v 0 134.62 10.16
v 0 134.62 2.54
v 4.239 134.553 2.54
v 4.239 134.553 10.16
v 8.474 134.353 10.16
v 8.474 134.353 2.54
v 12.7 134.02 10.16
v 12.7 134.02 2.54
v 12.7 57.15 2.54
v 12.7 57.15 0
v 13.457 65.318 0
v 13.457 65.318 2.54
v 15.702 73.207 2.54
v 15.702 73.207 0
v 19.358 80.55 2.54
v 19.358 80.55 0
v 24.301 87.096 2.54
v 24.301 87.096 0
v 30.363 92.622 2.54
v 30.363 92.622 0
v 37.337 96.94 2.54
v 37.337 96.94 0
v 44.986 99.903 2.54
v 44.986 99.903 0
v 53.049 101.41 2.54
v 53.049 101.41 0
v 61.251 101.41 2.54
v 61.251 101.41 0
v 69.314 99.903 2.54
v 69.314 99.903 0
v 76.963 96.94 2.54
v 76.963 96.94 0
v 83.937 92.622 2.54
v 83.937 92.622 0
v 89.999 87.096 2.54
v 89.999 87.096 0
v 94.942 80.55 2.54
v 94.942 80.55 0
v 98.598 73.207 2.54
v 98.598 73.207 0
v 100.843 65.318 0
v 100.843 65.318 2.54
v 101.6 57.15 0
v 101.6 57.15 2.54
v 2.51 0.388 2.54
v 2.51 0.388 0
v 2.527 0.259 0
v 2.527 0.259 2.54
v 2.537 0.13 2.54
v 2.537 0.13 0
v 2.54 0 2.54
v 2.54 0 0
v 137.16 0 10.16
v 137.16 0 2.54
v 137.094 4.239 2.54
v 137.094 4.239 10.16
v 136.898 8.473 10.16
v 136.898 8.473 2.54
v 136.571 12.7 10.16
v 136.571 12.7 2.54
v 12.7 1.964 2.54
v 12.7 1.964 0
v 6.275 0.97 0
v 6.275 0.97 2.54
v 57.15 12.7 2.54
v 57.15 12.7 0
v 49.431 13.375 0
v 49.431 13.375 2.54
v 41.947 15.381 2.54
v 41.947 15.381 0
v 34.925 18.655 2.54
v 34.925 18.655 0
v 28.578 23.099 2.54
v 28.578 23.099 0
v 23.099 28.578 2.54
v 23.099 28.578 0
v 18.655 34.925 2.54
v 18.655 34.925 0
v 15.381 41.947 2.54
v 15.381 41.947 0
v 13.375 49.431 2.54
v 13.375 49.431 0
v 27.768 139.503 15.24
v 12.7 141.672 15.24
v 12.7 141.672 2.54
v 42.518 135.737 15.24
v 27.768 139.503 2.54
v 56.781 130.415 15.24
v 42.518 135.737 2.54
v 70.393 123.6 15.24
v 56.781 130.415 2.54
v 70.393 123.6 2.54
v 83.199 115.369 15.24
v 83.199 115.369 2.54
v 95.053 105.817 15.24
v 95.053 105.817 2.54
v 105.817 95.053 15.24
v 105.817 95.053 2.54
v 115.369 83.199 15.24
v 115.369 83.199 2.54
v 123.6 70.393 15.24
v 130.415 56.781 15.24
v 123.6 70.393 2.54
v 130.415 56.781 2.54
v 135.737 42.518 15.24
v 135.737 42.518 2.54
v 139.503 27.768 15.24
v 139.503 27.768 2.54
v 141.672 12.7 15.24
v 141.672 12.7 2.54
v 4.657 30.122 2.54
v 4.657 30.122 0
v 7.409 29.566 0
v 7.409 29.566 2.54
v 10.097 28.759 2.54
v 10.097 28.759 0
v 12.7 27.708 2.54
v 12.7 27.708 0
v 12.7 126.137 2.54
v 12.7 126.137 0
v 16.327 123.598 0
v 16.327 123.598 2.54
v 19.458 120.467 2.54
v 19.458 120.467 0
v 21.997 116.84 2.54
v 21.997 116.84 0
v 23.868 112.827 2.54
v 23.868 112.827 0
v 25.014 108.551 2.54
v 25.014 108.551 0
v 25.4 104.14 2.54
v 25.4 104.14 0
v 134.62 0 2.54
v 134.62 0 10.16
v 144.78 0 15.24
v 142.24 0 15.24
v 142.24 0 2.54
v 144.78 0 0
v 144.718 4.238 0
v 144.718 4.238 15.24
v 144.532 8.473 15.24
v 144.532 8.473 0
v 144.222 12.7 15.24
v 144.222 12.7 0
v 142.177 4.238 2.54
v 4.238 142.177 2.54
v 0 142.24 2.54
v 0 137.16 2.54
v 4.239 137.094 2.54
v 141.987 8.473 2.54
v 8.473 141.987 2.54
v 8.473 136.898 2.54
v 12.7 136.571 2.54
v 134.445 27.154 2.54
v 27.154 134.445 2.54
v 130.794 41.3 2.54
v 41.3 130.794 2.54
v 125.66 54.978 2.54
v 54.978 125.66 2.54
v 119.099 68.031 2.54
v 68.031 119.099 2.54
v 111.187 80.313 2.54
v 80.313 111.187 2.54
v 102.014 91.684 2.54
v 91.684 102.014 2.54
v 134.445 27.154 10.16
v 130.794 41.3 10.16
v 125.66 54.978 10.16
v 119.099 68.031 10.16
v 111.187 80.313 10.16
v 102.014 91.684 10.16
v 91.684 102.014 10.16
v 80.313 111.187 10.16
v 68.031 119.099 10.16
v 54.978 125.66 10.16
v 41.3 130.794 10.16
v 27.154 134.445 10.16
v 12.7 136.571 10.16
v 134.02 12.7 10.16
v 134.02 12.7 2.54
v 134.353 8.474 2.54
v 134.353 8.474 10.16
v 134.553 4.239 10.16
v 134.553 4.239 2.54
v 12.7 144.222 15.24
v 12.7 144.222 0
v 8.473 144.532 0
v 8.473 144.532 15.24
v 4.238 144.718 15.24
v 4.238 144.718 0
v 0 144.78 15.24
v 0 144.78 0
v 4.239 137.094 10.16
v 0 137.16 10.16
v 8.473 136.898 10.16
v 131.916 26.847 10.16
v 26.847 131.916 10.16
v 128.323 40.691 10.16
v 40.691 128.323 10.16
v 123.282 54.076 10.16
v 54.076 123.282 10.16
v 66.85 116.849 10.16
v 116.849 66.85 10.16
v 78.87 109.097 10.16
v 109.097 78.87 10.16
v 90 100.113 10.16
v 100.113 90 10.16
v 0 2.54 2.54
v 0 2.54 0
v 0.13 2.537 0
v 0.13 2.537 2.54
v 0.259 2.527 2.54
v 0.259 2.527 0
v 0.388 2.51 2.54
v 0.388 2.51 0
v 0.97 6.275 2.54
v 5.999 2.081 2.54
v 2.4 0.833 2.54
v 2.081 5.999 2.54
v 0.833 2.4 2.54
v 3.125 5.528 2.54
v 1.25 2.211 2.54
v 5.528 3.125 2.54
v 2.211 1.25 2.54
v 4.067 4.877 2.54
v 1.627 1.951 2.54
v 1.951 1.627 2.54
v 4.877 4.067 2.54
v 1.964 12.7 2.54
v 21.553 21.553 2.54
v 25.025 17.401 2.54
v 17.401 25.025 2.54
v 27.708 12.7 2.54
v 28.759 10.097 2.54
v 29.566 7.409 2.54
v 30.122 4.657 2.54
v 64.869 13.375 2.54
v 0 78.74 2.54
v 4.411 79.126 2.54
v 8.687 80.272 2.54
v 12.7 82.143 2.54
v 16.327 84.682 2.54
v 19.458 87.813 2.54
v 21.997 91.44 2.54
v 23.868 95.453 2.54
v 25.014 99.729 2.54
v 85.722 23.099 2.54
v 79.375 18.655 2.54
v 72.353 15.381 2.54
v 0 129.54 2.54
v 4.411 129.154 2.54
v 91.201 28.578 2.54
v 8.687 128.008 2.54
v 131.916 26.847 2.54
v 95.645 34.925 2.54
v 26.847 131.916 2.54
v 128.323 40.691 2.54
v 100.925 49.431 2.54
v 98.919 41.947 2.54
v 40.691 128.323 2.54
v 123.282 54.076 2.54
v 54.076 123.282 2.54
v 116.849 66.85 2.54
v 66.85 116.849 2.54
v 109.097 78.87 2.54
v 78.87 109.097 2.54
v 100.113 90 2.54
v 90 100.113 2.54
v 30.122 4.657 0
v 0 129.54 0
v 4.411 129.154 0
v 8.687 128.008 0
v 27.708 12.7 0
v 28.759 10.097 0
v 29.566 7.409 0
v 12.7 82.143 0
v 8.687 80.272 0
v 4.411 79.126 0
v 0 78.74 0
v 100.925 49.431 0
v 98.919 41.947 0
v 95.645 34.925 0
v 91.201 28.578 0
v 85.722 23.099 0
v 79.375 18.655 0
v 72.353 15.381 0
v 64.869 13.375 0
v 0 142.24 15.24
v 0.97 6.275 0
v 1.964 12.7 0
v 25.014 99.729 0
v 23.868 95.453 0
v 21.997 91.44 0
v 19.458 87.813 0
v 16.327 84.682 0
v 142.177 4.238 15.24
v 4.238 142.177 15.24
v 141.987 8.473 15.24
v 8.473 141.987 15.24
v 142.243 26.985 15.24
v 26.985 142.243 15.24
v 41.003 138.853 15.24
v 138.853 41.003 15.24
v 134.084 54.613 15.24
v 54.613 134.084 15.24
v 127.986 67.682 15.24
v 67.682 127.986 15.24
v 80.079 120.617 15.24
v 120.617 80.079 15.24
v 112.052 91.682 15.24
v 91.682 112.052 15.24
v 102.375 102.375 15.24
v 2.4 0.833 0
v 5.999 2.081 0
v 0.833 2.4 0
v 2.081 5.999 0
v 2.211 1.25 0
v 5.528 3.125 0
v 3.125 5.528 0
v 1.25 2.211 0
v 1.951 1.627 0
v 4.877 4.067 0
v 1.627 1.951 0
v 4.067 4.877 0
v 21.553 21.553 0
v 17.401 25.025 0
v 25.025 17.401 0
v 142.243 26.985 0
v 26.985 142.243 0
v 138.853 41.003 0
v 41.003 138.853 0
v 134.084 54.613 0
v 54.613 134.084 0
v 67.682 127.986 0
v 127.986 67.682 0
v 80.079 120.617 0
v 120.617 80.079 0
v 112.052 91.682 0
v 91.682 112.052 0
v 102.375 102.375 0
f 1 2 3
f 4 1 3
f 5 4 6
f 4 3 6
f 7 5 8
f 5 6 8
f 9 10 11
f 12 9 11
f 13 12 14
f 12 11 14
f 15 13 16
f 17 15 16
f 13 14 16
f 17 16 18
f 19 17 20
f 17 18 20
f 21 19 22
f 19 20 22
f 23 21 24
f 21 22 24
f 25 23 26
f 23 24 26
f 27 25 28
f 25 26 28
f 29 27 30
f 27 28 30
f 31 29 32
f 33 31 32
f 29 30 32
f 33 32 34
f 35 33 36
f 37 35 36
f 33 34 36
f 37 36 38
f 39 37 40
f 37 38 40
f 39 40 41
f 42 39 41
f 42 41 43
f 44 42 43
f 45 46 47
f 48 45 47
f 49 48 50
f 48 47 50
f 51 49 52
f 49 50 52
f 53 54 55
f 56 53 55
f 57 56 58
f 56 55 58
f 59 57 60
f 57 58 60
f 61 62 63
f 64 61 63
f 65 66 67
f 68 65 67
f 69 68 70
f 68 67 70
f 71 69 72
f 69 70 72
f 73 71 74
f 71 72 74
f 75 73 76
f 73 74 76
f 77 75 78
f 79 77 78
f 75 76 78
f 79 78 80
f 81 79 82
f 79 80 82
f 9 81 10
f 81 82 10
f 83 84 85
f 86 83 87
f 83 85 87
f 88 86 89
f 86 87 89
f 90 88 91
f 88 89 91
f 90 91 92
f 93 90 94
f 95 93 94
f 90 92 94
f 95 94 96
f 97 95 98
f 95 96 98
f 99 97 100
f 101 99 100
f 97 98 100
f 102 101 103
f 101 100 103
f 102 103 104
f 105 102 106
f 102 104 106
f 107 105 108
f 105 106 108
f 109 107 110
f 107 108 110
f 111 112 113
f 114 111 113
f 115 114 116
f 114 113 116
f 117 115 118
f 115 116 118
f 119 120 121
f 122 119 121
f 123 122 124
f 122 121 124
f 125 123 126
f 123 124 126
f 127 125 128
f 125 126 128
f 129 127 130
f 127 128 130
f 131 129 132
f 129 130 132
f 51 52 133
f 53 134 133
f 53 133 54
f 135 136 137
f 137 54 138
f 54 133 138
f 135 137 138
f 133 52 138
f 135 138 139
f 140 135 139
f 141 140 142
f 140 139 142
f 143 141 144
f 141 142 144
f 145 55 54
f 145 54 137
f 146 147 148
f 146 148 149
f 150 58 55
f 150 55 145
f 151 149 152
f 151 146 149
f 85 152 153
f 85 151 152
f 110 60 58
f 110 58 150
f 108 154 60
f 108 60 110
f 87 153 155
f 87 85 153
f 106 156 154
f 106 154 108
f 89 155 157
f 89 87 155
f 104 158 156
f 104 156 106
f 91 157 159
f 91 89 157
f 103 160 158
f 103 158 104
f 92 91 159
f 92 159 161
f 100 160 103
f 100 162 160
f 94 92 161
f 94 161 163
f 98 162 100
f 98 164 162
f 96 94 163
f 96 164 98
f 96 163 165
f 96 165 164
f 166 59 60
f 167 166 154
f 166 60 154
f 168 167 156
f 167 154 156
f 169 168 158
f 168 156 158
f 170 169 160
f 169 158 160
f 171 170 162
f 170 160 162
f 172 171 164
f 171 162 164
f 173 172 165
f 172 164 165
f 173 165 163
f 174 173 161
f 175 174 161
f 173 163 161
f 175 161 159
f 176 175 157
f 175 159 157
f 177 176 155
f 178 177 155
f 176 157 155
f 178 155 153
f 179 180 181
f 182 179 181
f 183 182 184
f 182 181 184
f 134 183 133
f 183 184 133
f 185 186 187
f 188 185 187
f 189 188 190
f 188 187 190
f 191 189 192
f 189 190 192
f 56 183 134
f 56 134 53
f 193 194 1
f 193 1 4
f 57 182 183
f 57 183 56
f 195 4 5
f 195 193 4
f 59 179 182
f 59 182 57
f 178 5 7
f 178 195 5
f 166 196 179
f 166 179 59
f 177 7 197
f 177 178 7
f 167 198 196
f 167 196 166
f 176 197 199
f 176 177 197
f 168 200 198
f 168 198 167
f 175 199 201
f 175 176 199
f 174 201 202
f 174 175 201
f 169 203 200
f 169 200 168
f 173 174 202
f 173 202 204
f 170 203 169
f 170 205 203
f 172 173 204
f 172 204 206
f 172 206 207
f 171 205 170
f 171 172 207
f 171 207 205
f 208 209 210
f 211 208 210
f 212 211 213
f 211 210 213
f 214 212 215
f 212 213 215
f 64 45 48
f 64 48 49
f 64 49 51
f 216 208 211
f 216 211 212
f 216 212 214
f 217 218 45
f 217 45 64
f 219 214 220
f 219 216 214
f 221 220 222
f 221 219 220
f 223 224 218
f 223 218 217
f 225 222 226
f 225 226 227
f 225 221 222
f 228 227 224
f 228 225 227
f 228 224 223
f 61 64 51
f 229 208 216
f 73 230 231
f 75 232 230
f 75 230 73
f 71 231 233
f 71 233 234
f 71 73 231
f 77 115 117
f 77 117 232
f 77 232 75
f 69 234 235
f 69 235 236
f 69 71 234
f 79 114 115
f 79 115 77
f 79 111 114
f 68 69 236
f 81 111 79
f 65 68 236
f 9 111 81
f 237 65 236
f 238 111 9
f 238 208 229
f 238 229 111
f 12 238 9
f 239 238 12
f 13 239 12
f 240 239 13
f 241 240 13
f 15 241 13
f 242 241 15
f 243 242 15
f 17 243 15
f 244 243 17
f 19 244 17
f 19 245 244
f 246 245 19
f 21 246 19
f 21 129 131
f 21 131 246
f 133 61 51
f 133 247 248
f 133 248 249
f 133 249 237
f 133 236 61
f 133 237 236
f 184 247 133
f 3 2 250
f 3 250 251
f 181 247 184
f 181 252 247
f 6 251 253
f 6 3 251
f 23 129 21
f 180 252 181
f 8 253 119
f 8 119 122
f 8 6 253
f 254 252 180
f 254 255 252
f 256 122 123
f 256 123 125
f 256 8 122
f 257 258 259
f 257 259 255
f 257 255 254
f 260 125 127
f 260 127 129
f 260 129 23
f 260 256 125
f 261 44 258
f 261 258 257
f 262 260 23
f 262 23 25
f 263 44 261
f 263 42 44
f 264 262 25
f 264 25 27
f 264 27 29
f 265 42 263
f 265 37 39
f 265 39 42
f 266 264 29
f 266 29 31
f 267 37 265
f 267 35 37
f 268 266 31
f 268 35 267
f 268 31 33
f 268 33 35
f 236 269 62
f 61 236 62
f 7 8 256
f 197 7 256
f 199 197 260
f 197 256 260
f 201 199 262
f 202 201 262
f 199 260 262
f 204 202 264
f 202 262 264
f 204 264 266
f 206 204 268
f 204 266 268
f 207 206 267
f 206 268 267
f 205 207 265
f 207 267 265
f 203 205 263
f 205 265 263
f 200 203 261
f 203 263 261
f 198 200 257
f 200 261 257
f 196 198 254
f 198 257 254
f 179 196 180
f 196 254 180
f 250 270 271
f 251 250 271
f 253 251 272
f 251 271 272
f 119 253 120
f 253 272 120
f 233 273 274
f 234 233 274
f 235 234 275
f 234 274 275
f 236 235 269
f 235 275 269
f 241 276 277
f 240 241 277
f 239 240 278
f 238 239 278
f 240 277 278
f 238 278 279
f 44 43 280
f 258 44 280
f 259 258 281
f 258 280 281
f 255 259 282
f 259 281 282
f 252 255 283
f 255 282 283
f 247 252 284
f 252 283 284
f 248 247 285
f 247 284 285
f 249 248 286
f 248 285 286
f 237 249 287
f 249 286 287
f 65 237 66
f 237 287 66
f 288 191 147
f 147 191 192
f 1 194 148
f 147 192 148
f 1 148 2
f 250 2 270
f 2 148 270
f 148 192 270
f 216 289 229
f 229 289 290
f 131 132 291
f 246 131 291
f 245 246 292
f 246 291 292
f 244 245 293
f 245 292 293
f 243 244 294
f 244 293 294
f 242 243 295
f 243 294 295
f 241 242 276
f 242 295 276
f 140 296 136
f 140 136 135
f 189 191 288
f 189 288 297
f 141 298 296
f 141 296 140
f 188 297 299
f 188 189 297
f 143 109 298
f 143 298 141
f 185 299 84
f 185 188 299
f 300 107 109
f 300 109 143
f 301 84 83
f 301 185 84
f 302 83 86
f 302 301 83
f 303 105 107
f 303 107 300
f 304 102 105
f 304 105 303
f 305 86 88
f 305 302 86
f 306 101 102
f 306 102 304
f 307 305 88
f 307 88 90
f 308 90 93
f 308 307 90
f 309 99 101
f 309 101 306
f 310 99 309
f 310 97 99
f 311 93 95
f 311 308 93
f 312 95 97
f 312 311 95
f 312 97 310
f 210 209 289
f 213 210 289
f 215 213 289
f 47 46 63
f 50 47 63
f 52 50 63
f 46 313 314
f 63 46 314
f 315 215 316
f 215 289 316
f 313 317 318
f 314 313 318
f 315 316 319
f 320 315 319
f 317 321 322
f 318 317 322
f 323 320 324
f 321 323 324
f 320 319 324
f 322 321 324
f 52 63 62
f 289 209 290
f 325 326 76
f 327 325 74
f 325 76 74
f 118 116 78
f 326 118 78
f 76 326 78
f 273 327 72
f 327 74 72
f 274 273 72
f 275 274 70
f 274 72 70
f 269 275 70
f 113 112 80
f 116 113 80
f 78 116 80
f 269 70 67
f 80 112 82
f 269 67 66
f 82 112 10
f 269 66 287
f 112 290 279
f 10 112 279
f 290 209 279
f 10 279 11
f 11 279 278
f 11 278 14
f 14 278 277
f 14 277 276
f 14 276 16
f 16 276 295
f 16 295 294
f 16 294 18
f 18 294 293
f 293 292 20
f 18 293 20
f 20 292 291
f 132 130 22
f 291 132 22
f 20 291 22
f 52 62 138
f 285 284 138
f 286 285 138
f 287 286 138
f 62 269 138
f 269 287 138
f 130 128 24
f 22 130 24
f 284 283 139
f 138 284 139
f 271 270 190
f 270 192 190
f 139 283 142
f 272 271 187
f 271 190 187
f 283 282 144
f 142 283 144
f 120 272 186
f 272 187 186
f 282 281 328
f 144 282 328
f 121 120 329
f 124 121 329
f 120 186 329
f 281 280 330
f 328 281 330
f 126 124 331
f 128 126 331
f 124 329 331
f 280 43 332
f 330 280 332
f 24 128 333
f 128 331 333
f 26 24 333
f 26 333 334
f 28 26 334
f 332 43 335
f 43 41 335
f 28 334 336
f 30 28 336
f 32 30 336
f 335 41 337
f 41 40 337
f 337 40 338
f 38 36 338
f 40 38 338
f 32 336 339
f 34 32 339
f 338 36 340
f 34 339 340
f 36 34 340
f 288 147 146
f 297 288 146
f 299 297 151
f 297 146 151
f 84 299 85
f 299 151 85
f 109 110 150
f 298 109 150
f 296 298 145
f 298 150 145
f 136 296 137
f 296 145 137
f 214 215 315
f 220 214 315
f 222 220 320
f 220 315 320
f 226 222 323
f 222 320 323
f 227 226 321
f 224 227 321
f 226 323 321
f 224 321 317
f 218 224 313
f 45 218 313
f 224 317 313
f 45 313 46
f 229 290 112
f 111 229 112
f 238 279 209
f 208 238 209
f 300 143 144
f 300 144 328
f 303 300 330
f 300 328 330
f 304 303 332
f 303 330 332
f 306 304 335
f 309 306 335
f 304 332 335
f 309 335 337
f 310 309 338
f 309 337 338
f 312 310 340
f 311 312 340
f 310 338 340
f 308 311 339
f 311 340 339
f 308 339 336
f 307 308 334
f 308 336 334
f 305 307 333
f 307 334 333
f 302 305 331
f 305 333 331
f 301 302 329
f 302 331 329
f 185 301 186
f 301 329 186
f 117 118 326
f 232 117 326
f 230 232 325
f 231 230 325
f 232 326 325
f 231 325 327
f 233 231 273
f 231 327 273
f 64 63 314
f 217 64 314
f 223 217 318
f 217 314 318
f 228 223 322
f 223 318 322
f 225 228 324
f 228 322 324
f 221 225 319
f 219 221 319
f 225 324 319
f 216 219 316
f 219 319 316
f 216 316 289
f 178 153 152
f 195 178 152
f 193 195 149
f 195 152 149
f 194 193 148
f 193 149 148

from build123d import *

# Parameters (mm, degrees)
F1_DEPTH = 2.54
F2_DEPTH = 10.16
F3_DEPTH = 2.54
F4_DEPTH = 15.24


with BuildPart() as f1:
    # F0 (on Top) → F1 (new body)
    with BuildSketch(Plane.XY):
        with BuildLine():
            Line((4.6571345698, 30.12210978), (12.7, 82.1429547439))
            ThreePointArc((12.7, 82.1429547439), (6.5740037456, 79.6054840123), (0, 78.74))
            Line((0, 78.74), (0, 30.48))
            ThreePointArc((0, 30.48), (2.3354329262, 30.3903957369), (4.6571345698, 30.12210978))
        make_face()
        with BuildLine():
            Line((12.7, 57.15), (12.7, 82.1429547439))
            Line((12.7, 82.1429547439), (4.6571345698, 30.12210978))
            ThreePointArc((4.6571345698, 30.12210978), (8.7620977053, 29.1934246673), (12.7, 27.7081287712))
            Line((12.7, 27.7081287712), (12.7, 57.15))
        make_face()
        with BuildLine():
            Line((1.9635281017, 12.7), (4.6571345698, 30.12210978))
            ThreePointArc((4.6571345698, 30.12210978), (2.3354329262, 30.3903957369), (0, 30.48))
            Line((0, 30.48), (0, 12.7))
            Line((0, 12.7), (1.9635281017, 12.7))
        make_face()
        with BuildLine():
            Line((0.9702363687, 6.2754395375), (1.9635281017, 12.7))
            Line((1.9635281017, 12.7), (0, 12.7))
            Line((0, 12.7), (0, 6.35))
            ThreePointArc((0, 6.35), (0.4865485263, 6.3313324452), (0.9702363687, 6.2754395375))
        make_face()
        with BuildLine():
            Line((0.3880945475, 2.510175815), (0.9702363687, 6.2754395375))
            ThreePointArc((0.9702363687, 6.2754395375), (0.4865485263, 6.3313324452), (0, 6.35))
            Line((0, 6.35), (0, 2.54))
            ThreePointArc((0, 2.54), (0.1946194105, 2.5325329781), (0.3880945475, 2.510175815))
        make_face()
        with BuildLine():
            Line((2.510175815, 0.3880945475), (6.2754395375, 0.9702363687))
            ThreePointArc((6.2754395375, 0.9702363687), (4.4901280605, 4.4901280605), (0.9702363687, 6.2754395375))
            Line((0.9702363687, 6.2754395375), (0.3880945475, 2.510175815))
            ThreePointArc((0.3880945475, 2.510175815), (1.7960512242, 1.7960512242), (2.510175815, 0.3880945475))
        make_face()
        with BuildLine():
            Line((2.54, 0), (6.35, 0))
            ThreePointArc((6.35, 0), (6.3313324452, 0.4865485263), (6.2754395375, 0.9702363687))
            Line((6.2754395375, 0.9702363687), (2.510175815, 0.3880945475))
            ThreePointArc((2.510175815, 0.3880945475), (2.5325329781, 0.1946194105), (2.54, 0))
        make_face()
        with BuildLine():
            Line((6.35, 0), (12.7, 0))
            Line((12.7, 0), (12.7, 1.9635281017))
            Line((12.7, 1.9635281017), (6.2754395375, 0.9702363687))
            ThreePointArc((6.2754395375, 0.9702363687), (6.3313324452, 0.4865485263), (6.35, 0))
        make_face()
        with BuildLine():
            Line((12.7, 0), (30.48, 0))
            ThreePointArc((30.48, 0), (30.3903957369, 2.3354329262), (30.12210978, 4.6571345698))
            Line((30.12210978, 4.6571345698), (12.7, 1.9635281017))
            Line((12.7, 1.9635281017), (12.7, 0))
        make_face()
        with BuildLine():
            Line((30.48, 0), (78.74, 0))
            ThreePointArc((78.74, 0), (79.6054840123, 6.5740037456), (82.1429547439, 12.7))
            Line((82.1429547439, 12.7), (30.12210978, 4.6571345698))
            ThreePointArc((30.12210978, 4.6571345698), (30.3903957369, 2.3354329262), (30.48, 0))
        make_face()
        with BuildLine():
            Line((27.7081287712, 12.7), (57.15, 12.7))
            ThreePointArc((57.15, 12.7), (25.7191035763, 25.7191035763), (12.7, 57.15))
            Line((12.7, 57.15), (12.7, 27.7081287712))
            ThreePointArc((12.7, 27.7081287712), (21.5526146906, 21.5526146906), (27.7081287712, 12.7))
        make_face()
        with BuildLine():
            Line((30.12210978, 4.6571345698), (82.1429547439, 12.7))
            Line((82.1429547439, 12.7), (57.15, 12.7))
            Line((57.15, 12.7), (27.7081287712, 12.7))
            ThreePointArc((27.7081287712, 12.7), (29.1934246673, 8.7620977053), (30.12210978, 4.6571345698))
        make_face()
        with BuildLine():
            Line((126.1370452561, 12.7), (134.0196045361, 12.7))
            ThreePointArc((134.0196045361, 12.7), (95.1907148833, 95.1907148833), (12.7, 134.0196045361))
            Line((12.7, 134.0196045361), (12.7, 126.1370452561))
            ThreePointArc((12.7, 126.1370452561), (21.9970452561, 116.84), (25.4, 104.14))
            ThreePointArc((25.4, 104.14), (21.9970452561, 91.44), (12.7, 82.1429547439))
            Line((12.7, 82.1429547439), (12.7, 57.15))
            ThreePointArc((12.7, 57.15), (57.15, 101.6), (101.6, 57.15))
            ThreePointArc((101.6, 57.15), (88.5808964237, 25.7191035763), (57.15, 12.7))
            Line((57.15, 12.7), (82.1429547439, 12.7))
            ThreePointArc((82.1429547439, 12.7), (104.14, 25.4), (126.1370452561, 12.7))
        make_face()
        with BuildLine():
            Line((129.54, 0), (134.62, 0))
            ThreePointArc((134.62, 0), (134.4698173618, 6.3570919986), (134.0196045361, 12.7))
            Line((134.0196045361, 12.7), (126.1370452561, 12.7))
            ThreePointArc((126.1370452561, 12.7), (128.6745159877, 6.5740037456), (129.54, 0))
        make_face()
        with BuildLine():
            Line((12.7, 126.1370452561), (12.7, 134.0196045361))
            ThreePointArc((12.7, 134.0196045361), (6.3570919986, 134.4698173618), (0, 134.62))
            Line((0, 134.62), (0, 129.54))
            ThreePointArc((0, 129.54), (6.5740037456, 128.6745159877), (12.7, 126.1370452561))
        make_face()
        with BuildLine():
            Line((82.1429547439, 12.7), (126.1370452561, 12.7))
            ThreePointArc((126.1370452561, 12.7), (104.14, 25.4), (82.1429547439, 12.7))
        make_face()
        with BuildLine():
            Line((78.74, 0), (129.54, 0))
            ThreePointArc((129.54, 0), (128.6745159877, 6.5740037456), (126.1370452561, 12.7))
            Line((126.1370452561, 12.7), (82.1429547439, 12.7))
            ThreePointArc((82.1429547439, 12.7), (79.6054840123, 6.5740037456), (78.74, 0))
        make_face()
    extrude(amount=F1_DEPTH)

    # F0 (on Top) → F2 (join)
    with BuildSketch(Plane.XY):
        with BuildLine():
            ThreePointArc((134.0196045361, 12.7), (134.4698173618, 6.3570919986), (134.62, 0))
            Line((134.62, 0), (137.16, 0))
            ThreePointArc((137.16, 0), (137.0126136617, 6.3568307817), (136.5707713971, 12.7))
            Line((136.5707713971, 12.7), (134.0196045361, 12.7))
        make_face()
        with BuildLine():
            ThreePointArc((12.7, 134.0196045361), (95.1907148833, 95.1907148833), (134.0196045361, 12.7))
            Line((134.0196045361, 12.7), (136.5707713971, 12.7))
            ThreePointArc((136.5707713971, 12.7), (96.9867661075, 96.9867661075), (12.7, 136.5707713971))
            Line((12.7, 136.5707713971), (12.7, 134.0196045361))
        make_face()
        with BuildLine():
            ThreePointArc((0, 134.62), (6.3570919986, 134.4698173618), (12.7, 134.0196045361))
            Line((12.7, 134.0196045361), (12.7, 136.5707713971))
            ThreePointArc((12.7, 136.5707713971), (6.3568307817, 137.0126136617), (0, 137.16))
            Line((0, 137.16), (0, 134.62))
        make_face()
    extrude(amount=F2_DEPTH)

    # F0 (on Top) → F3 (join)
    with BuildSketch(Plane.XY):
        with BuildLine():
            ThreePointArc((136.5707713971, 12.7), (137.0126136617, 6.3568307817), (137.16, 0))
            Line((137.16, 0), (142.24, 0))
            ThreePointArc((142.24, 0), (142.0979043334, 6.3563499), (141.6719012366, 12.7))
            Line((141.6719012366, 12.7), (136.5707713971, 12.7))
        make_face()
        with BuildLine():
            ThreePointArc((12.7, 136.5707713971), (96.9867661075, 96.9867661075), (136.5707713971, 12.7))
            Line((136.5707713971, 12.7), (141.6719012366, 12.7))
            ThreePointArc((141.6719012366, 12.7), (100.578868556, 100.578868556), (12.7, 141.6719012366))
            Line((12.7, 141.6719012366), (12.7, 136.5707713971))
        make_face()
        with BuildLine():
            ThreePointArc((0, 137.16), (6.3568307817, 137.0126136617), (12.7, 136.5707713971))
            Line((12.7, 136.5707713971), (12.7, 141.6719012366))
            ThreePointArc((12.7, 141.6719012366), (6.3563499, 142.0979043334), (0, 142.24))
            Line((0, 142.24), (0, 137.16))
        make_face()
    extrude(amount=F3_DEPTH)

    # F0 (on Top) → F4 (join)
    with BuildSketch(Plane.XY):
        with BuildLine():
            ThreePointArc((12.7, 141.6719012366), (100.578868556, 100.578868556), (141.6719012366, 12.7))
            Line((141.6719012366, 12.7), (144.2219067964, 12.7))
            ThreePointArc((144.2219067964, 12.7), (102.3749197802, 102.3749197802), (12.7, 144.2219067964))
            Line((12.7, 144.2219067964), (12.7, 141.6719012366))
        make_face()
        with BuildLine():
            ThreePointArc((0, 142.24), (6.3563499, 142.0979043334), (12.7, 141.6719012366))
            Line((12.7, 141.6719012366), (12.7, 144.2219067964))
            ThreePointArc((12.7, 144.2219067964), (6.3561283031, 144.6404094055), (0, 144.78))
            Line((0, 144.78), (0, 142.24))
        make_face()
        with BuildLine():
            ThreePointArc((141.6719012366, 12.7), (142.0979043334, 6.3563499), (142.24, 0))
            Line((142.24, 0), (144.78, 0))
            ThreePointArc((144.78, 0), (144.6404094055, 6.3561283031), (144.2219067964, 12.7))
            Line((144.2219067964, 12.7), (141.6719012366, 12.7))
        make_face()
    extrude(amount=F4_DEPTH)


solid = f1.part
